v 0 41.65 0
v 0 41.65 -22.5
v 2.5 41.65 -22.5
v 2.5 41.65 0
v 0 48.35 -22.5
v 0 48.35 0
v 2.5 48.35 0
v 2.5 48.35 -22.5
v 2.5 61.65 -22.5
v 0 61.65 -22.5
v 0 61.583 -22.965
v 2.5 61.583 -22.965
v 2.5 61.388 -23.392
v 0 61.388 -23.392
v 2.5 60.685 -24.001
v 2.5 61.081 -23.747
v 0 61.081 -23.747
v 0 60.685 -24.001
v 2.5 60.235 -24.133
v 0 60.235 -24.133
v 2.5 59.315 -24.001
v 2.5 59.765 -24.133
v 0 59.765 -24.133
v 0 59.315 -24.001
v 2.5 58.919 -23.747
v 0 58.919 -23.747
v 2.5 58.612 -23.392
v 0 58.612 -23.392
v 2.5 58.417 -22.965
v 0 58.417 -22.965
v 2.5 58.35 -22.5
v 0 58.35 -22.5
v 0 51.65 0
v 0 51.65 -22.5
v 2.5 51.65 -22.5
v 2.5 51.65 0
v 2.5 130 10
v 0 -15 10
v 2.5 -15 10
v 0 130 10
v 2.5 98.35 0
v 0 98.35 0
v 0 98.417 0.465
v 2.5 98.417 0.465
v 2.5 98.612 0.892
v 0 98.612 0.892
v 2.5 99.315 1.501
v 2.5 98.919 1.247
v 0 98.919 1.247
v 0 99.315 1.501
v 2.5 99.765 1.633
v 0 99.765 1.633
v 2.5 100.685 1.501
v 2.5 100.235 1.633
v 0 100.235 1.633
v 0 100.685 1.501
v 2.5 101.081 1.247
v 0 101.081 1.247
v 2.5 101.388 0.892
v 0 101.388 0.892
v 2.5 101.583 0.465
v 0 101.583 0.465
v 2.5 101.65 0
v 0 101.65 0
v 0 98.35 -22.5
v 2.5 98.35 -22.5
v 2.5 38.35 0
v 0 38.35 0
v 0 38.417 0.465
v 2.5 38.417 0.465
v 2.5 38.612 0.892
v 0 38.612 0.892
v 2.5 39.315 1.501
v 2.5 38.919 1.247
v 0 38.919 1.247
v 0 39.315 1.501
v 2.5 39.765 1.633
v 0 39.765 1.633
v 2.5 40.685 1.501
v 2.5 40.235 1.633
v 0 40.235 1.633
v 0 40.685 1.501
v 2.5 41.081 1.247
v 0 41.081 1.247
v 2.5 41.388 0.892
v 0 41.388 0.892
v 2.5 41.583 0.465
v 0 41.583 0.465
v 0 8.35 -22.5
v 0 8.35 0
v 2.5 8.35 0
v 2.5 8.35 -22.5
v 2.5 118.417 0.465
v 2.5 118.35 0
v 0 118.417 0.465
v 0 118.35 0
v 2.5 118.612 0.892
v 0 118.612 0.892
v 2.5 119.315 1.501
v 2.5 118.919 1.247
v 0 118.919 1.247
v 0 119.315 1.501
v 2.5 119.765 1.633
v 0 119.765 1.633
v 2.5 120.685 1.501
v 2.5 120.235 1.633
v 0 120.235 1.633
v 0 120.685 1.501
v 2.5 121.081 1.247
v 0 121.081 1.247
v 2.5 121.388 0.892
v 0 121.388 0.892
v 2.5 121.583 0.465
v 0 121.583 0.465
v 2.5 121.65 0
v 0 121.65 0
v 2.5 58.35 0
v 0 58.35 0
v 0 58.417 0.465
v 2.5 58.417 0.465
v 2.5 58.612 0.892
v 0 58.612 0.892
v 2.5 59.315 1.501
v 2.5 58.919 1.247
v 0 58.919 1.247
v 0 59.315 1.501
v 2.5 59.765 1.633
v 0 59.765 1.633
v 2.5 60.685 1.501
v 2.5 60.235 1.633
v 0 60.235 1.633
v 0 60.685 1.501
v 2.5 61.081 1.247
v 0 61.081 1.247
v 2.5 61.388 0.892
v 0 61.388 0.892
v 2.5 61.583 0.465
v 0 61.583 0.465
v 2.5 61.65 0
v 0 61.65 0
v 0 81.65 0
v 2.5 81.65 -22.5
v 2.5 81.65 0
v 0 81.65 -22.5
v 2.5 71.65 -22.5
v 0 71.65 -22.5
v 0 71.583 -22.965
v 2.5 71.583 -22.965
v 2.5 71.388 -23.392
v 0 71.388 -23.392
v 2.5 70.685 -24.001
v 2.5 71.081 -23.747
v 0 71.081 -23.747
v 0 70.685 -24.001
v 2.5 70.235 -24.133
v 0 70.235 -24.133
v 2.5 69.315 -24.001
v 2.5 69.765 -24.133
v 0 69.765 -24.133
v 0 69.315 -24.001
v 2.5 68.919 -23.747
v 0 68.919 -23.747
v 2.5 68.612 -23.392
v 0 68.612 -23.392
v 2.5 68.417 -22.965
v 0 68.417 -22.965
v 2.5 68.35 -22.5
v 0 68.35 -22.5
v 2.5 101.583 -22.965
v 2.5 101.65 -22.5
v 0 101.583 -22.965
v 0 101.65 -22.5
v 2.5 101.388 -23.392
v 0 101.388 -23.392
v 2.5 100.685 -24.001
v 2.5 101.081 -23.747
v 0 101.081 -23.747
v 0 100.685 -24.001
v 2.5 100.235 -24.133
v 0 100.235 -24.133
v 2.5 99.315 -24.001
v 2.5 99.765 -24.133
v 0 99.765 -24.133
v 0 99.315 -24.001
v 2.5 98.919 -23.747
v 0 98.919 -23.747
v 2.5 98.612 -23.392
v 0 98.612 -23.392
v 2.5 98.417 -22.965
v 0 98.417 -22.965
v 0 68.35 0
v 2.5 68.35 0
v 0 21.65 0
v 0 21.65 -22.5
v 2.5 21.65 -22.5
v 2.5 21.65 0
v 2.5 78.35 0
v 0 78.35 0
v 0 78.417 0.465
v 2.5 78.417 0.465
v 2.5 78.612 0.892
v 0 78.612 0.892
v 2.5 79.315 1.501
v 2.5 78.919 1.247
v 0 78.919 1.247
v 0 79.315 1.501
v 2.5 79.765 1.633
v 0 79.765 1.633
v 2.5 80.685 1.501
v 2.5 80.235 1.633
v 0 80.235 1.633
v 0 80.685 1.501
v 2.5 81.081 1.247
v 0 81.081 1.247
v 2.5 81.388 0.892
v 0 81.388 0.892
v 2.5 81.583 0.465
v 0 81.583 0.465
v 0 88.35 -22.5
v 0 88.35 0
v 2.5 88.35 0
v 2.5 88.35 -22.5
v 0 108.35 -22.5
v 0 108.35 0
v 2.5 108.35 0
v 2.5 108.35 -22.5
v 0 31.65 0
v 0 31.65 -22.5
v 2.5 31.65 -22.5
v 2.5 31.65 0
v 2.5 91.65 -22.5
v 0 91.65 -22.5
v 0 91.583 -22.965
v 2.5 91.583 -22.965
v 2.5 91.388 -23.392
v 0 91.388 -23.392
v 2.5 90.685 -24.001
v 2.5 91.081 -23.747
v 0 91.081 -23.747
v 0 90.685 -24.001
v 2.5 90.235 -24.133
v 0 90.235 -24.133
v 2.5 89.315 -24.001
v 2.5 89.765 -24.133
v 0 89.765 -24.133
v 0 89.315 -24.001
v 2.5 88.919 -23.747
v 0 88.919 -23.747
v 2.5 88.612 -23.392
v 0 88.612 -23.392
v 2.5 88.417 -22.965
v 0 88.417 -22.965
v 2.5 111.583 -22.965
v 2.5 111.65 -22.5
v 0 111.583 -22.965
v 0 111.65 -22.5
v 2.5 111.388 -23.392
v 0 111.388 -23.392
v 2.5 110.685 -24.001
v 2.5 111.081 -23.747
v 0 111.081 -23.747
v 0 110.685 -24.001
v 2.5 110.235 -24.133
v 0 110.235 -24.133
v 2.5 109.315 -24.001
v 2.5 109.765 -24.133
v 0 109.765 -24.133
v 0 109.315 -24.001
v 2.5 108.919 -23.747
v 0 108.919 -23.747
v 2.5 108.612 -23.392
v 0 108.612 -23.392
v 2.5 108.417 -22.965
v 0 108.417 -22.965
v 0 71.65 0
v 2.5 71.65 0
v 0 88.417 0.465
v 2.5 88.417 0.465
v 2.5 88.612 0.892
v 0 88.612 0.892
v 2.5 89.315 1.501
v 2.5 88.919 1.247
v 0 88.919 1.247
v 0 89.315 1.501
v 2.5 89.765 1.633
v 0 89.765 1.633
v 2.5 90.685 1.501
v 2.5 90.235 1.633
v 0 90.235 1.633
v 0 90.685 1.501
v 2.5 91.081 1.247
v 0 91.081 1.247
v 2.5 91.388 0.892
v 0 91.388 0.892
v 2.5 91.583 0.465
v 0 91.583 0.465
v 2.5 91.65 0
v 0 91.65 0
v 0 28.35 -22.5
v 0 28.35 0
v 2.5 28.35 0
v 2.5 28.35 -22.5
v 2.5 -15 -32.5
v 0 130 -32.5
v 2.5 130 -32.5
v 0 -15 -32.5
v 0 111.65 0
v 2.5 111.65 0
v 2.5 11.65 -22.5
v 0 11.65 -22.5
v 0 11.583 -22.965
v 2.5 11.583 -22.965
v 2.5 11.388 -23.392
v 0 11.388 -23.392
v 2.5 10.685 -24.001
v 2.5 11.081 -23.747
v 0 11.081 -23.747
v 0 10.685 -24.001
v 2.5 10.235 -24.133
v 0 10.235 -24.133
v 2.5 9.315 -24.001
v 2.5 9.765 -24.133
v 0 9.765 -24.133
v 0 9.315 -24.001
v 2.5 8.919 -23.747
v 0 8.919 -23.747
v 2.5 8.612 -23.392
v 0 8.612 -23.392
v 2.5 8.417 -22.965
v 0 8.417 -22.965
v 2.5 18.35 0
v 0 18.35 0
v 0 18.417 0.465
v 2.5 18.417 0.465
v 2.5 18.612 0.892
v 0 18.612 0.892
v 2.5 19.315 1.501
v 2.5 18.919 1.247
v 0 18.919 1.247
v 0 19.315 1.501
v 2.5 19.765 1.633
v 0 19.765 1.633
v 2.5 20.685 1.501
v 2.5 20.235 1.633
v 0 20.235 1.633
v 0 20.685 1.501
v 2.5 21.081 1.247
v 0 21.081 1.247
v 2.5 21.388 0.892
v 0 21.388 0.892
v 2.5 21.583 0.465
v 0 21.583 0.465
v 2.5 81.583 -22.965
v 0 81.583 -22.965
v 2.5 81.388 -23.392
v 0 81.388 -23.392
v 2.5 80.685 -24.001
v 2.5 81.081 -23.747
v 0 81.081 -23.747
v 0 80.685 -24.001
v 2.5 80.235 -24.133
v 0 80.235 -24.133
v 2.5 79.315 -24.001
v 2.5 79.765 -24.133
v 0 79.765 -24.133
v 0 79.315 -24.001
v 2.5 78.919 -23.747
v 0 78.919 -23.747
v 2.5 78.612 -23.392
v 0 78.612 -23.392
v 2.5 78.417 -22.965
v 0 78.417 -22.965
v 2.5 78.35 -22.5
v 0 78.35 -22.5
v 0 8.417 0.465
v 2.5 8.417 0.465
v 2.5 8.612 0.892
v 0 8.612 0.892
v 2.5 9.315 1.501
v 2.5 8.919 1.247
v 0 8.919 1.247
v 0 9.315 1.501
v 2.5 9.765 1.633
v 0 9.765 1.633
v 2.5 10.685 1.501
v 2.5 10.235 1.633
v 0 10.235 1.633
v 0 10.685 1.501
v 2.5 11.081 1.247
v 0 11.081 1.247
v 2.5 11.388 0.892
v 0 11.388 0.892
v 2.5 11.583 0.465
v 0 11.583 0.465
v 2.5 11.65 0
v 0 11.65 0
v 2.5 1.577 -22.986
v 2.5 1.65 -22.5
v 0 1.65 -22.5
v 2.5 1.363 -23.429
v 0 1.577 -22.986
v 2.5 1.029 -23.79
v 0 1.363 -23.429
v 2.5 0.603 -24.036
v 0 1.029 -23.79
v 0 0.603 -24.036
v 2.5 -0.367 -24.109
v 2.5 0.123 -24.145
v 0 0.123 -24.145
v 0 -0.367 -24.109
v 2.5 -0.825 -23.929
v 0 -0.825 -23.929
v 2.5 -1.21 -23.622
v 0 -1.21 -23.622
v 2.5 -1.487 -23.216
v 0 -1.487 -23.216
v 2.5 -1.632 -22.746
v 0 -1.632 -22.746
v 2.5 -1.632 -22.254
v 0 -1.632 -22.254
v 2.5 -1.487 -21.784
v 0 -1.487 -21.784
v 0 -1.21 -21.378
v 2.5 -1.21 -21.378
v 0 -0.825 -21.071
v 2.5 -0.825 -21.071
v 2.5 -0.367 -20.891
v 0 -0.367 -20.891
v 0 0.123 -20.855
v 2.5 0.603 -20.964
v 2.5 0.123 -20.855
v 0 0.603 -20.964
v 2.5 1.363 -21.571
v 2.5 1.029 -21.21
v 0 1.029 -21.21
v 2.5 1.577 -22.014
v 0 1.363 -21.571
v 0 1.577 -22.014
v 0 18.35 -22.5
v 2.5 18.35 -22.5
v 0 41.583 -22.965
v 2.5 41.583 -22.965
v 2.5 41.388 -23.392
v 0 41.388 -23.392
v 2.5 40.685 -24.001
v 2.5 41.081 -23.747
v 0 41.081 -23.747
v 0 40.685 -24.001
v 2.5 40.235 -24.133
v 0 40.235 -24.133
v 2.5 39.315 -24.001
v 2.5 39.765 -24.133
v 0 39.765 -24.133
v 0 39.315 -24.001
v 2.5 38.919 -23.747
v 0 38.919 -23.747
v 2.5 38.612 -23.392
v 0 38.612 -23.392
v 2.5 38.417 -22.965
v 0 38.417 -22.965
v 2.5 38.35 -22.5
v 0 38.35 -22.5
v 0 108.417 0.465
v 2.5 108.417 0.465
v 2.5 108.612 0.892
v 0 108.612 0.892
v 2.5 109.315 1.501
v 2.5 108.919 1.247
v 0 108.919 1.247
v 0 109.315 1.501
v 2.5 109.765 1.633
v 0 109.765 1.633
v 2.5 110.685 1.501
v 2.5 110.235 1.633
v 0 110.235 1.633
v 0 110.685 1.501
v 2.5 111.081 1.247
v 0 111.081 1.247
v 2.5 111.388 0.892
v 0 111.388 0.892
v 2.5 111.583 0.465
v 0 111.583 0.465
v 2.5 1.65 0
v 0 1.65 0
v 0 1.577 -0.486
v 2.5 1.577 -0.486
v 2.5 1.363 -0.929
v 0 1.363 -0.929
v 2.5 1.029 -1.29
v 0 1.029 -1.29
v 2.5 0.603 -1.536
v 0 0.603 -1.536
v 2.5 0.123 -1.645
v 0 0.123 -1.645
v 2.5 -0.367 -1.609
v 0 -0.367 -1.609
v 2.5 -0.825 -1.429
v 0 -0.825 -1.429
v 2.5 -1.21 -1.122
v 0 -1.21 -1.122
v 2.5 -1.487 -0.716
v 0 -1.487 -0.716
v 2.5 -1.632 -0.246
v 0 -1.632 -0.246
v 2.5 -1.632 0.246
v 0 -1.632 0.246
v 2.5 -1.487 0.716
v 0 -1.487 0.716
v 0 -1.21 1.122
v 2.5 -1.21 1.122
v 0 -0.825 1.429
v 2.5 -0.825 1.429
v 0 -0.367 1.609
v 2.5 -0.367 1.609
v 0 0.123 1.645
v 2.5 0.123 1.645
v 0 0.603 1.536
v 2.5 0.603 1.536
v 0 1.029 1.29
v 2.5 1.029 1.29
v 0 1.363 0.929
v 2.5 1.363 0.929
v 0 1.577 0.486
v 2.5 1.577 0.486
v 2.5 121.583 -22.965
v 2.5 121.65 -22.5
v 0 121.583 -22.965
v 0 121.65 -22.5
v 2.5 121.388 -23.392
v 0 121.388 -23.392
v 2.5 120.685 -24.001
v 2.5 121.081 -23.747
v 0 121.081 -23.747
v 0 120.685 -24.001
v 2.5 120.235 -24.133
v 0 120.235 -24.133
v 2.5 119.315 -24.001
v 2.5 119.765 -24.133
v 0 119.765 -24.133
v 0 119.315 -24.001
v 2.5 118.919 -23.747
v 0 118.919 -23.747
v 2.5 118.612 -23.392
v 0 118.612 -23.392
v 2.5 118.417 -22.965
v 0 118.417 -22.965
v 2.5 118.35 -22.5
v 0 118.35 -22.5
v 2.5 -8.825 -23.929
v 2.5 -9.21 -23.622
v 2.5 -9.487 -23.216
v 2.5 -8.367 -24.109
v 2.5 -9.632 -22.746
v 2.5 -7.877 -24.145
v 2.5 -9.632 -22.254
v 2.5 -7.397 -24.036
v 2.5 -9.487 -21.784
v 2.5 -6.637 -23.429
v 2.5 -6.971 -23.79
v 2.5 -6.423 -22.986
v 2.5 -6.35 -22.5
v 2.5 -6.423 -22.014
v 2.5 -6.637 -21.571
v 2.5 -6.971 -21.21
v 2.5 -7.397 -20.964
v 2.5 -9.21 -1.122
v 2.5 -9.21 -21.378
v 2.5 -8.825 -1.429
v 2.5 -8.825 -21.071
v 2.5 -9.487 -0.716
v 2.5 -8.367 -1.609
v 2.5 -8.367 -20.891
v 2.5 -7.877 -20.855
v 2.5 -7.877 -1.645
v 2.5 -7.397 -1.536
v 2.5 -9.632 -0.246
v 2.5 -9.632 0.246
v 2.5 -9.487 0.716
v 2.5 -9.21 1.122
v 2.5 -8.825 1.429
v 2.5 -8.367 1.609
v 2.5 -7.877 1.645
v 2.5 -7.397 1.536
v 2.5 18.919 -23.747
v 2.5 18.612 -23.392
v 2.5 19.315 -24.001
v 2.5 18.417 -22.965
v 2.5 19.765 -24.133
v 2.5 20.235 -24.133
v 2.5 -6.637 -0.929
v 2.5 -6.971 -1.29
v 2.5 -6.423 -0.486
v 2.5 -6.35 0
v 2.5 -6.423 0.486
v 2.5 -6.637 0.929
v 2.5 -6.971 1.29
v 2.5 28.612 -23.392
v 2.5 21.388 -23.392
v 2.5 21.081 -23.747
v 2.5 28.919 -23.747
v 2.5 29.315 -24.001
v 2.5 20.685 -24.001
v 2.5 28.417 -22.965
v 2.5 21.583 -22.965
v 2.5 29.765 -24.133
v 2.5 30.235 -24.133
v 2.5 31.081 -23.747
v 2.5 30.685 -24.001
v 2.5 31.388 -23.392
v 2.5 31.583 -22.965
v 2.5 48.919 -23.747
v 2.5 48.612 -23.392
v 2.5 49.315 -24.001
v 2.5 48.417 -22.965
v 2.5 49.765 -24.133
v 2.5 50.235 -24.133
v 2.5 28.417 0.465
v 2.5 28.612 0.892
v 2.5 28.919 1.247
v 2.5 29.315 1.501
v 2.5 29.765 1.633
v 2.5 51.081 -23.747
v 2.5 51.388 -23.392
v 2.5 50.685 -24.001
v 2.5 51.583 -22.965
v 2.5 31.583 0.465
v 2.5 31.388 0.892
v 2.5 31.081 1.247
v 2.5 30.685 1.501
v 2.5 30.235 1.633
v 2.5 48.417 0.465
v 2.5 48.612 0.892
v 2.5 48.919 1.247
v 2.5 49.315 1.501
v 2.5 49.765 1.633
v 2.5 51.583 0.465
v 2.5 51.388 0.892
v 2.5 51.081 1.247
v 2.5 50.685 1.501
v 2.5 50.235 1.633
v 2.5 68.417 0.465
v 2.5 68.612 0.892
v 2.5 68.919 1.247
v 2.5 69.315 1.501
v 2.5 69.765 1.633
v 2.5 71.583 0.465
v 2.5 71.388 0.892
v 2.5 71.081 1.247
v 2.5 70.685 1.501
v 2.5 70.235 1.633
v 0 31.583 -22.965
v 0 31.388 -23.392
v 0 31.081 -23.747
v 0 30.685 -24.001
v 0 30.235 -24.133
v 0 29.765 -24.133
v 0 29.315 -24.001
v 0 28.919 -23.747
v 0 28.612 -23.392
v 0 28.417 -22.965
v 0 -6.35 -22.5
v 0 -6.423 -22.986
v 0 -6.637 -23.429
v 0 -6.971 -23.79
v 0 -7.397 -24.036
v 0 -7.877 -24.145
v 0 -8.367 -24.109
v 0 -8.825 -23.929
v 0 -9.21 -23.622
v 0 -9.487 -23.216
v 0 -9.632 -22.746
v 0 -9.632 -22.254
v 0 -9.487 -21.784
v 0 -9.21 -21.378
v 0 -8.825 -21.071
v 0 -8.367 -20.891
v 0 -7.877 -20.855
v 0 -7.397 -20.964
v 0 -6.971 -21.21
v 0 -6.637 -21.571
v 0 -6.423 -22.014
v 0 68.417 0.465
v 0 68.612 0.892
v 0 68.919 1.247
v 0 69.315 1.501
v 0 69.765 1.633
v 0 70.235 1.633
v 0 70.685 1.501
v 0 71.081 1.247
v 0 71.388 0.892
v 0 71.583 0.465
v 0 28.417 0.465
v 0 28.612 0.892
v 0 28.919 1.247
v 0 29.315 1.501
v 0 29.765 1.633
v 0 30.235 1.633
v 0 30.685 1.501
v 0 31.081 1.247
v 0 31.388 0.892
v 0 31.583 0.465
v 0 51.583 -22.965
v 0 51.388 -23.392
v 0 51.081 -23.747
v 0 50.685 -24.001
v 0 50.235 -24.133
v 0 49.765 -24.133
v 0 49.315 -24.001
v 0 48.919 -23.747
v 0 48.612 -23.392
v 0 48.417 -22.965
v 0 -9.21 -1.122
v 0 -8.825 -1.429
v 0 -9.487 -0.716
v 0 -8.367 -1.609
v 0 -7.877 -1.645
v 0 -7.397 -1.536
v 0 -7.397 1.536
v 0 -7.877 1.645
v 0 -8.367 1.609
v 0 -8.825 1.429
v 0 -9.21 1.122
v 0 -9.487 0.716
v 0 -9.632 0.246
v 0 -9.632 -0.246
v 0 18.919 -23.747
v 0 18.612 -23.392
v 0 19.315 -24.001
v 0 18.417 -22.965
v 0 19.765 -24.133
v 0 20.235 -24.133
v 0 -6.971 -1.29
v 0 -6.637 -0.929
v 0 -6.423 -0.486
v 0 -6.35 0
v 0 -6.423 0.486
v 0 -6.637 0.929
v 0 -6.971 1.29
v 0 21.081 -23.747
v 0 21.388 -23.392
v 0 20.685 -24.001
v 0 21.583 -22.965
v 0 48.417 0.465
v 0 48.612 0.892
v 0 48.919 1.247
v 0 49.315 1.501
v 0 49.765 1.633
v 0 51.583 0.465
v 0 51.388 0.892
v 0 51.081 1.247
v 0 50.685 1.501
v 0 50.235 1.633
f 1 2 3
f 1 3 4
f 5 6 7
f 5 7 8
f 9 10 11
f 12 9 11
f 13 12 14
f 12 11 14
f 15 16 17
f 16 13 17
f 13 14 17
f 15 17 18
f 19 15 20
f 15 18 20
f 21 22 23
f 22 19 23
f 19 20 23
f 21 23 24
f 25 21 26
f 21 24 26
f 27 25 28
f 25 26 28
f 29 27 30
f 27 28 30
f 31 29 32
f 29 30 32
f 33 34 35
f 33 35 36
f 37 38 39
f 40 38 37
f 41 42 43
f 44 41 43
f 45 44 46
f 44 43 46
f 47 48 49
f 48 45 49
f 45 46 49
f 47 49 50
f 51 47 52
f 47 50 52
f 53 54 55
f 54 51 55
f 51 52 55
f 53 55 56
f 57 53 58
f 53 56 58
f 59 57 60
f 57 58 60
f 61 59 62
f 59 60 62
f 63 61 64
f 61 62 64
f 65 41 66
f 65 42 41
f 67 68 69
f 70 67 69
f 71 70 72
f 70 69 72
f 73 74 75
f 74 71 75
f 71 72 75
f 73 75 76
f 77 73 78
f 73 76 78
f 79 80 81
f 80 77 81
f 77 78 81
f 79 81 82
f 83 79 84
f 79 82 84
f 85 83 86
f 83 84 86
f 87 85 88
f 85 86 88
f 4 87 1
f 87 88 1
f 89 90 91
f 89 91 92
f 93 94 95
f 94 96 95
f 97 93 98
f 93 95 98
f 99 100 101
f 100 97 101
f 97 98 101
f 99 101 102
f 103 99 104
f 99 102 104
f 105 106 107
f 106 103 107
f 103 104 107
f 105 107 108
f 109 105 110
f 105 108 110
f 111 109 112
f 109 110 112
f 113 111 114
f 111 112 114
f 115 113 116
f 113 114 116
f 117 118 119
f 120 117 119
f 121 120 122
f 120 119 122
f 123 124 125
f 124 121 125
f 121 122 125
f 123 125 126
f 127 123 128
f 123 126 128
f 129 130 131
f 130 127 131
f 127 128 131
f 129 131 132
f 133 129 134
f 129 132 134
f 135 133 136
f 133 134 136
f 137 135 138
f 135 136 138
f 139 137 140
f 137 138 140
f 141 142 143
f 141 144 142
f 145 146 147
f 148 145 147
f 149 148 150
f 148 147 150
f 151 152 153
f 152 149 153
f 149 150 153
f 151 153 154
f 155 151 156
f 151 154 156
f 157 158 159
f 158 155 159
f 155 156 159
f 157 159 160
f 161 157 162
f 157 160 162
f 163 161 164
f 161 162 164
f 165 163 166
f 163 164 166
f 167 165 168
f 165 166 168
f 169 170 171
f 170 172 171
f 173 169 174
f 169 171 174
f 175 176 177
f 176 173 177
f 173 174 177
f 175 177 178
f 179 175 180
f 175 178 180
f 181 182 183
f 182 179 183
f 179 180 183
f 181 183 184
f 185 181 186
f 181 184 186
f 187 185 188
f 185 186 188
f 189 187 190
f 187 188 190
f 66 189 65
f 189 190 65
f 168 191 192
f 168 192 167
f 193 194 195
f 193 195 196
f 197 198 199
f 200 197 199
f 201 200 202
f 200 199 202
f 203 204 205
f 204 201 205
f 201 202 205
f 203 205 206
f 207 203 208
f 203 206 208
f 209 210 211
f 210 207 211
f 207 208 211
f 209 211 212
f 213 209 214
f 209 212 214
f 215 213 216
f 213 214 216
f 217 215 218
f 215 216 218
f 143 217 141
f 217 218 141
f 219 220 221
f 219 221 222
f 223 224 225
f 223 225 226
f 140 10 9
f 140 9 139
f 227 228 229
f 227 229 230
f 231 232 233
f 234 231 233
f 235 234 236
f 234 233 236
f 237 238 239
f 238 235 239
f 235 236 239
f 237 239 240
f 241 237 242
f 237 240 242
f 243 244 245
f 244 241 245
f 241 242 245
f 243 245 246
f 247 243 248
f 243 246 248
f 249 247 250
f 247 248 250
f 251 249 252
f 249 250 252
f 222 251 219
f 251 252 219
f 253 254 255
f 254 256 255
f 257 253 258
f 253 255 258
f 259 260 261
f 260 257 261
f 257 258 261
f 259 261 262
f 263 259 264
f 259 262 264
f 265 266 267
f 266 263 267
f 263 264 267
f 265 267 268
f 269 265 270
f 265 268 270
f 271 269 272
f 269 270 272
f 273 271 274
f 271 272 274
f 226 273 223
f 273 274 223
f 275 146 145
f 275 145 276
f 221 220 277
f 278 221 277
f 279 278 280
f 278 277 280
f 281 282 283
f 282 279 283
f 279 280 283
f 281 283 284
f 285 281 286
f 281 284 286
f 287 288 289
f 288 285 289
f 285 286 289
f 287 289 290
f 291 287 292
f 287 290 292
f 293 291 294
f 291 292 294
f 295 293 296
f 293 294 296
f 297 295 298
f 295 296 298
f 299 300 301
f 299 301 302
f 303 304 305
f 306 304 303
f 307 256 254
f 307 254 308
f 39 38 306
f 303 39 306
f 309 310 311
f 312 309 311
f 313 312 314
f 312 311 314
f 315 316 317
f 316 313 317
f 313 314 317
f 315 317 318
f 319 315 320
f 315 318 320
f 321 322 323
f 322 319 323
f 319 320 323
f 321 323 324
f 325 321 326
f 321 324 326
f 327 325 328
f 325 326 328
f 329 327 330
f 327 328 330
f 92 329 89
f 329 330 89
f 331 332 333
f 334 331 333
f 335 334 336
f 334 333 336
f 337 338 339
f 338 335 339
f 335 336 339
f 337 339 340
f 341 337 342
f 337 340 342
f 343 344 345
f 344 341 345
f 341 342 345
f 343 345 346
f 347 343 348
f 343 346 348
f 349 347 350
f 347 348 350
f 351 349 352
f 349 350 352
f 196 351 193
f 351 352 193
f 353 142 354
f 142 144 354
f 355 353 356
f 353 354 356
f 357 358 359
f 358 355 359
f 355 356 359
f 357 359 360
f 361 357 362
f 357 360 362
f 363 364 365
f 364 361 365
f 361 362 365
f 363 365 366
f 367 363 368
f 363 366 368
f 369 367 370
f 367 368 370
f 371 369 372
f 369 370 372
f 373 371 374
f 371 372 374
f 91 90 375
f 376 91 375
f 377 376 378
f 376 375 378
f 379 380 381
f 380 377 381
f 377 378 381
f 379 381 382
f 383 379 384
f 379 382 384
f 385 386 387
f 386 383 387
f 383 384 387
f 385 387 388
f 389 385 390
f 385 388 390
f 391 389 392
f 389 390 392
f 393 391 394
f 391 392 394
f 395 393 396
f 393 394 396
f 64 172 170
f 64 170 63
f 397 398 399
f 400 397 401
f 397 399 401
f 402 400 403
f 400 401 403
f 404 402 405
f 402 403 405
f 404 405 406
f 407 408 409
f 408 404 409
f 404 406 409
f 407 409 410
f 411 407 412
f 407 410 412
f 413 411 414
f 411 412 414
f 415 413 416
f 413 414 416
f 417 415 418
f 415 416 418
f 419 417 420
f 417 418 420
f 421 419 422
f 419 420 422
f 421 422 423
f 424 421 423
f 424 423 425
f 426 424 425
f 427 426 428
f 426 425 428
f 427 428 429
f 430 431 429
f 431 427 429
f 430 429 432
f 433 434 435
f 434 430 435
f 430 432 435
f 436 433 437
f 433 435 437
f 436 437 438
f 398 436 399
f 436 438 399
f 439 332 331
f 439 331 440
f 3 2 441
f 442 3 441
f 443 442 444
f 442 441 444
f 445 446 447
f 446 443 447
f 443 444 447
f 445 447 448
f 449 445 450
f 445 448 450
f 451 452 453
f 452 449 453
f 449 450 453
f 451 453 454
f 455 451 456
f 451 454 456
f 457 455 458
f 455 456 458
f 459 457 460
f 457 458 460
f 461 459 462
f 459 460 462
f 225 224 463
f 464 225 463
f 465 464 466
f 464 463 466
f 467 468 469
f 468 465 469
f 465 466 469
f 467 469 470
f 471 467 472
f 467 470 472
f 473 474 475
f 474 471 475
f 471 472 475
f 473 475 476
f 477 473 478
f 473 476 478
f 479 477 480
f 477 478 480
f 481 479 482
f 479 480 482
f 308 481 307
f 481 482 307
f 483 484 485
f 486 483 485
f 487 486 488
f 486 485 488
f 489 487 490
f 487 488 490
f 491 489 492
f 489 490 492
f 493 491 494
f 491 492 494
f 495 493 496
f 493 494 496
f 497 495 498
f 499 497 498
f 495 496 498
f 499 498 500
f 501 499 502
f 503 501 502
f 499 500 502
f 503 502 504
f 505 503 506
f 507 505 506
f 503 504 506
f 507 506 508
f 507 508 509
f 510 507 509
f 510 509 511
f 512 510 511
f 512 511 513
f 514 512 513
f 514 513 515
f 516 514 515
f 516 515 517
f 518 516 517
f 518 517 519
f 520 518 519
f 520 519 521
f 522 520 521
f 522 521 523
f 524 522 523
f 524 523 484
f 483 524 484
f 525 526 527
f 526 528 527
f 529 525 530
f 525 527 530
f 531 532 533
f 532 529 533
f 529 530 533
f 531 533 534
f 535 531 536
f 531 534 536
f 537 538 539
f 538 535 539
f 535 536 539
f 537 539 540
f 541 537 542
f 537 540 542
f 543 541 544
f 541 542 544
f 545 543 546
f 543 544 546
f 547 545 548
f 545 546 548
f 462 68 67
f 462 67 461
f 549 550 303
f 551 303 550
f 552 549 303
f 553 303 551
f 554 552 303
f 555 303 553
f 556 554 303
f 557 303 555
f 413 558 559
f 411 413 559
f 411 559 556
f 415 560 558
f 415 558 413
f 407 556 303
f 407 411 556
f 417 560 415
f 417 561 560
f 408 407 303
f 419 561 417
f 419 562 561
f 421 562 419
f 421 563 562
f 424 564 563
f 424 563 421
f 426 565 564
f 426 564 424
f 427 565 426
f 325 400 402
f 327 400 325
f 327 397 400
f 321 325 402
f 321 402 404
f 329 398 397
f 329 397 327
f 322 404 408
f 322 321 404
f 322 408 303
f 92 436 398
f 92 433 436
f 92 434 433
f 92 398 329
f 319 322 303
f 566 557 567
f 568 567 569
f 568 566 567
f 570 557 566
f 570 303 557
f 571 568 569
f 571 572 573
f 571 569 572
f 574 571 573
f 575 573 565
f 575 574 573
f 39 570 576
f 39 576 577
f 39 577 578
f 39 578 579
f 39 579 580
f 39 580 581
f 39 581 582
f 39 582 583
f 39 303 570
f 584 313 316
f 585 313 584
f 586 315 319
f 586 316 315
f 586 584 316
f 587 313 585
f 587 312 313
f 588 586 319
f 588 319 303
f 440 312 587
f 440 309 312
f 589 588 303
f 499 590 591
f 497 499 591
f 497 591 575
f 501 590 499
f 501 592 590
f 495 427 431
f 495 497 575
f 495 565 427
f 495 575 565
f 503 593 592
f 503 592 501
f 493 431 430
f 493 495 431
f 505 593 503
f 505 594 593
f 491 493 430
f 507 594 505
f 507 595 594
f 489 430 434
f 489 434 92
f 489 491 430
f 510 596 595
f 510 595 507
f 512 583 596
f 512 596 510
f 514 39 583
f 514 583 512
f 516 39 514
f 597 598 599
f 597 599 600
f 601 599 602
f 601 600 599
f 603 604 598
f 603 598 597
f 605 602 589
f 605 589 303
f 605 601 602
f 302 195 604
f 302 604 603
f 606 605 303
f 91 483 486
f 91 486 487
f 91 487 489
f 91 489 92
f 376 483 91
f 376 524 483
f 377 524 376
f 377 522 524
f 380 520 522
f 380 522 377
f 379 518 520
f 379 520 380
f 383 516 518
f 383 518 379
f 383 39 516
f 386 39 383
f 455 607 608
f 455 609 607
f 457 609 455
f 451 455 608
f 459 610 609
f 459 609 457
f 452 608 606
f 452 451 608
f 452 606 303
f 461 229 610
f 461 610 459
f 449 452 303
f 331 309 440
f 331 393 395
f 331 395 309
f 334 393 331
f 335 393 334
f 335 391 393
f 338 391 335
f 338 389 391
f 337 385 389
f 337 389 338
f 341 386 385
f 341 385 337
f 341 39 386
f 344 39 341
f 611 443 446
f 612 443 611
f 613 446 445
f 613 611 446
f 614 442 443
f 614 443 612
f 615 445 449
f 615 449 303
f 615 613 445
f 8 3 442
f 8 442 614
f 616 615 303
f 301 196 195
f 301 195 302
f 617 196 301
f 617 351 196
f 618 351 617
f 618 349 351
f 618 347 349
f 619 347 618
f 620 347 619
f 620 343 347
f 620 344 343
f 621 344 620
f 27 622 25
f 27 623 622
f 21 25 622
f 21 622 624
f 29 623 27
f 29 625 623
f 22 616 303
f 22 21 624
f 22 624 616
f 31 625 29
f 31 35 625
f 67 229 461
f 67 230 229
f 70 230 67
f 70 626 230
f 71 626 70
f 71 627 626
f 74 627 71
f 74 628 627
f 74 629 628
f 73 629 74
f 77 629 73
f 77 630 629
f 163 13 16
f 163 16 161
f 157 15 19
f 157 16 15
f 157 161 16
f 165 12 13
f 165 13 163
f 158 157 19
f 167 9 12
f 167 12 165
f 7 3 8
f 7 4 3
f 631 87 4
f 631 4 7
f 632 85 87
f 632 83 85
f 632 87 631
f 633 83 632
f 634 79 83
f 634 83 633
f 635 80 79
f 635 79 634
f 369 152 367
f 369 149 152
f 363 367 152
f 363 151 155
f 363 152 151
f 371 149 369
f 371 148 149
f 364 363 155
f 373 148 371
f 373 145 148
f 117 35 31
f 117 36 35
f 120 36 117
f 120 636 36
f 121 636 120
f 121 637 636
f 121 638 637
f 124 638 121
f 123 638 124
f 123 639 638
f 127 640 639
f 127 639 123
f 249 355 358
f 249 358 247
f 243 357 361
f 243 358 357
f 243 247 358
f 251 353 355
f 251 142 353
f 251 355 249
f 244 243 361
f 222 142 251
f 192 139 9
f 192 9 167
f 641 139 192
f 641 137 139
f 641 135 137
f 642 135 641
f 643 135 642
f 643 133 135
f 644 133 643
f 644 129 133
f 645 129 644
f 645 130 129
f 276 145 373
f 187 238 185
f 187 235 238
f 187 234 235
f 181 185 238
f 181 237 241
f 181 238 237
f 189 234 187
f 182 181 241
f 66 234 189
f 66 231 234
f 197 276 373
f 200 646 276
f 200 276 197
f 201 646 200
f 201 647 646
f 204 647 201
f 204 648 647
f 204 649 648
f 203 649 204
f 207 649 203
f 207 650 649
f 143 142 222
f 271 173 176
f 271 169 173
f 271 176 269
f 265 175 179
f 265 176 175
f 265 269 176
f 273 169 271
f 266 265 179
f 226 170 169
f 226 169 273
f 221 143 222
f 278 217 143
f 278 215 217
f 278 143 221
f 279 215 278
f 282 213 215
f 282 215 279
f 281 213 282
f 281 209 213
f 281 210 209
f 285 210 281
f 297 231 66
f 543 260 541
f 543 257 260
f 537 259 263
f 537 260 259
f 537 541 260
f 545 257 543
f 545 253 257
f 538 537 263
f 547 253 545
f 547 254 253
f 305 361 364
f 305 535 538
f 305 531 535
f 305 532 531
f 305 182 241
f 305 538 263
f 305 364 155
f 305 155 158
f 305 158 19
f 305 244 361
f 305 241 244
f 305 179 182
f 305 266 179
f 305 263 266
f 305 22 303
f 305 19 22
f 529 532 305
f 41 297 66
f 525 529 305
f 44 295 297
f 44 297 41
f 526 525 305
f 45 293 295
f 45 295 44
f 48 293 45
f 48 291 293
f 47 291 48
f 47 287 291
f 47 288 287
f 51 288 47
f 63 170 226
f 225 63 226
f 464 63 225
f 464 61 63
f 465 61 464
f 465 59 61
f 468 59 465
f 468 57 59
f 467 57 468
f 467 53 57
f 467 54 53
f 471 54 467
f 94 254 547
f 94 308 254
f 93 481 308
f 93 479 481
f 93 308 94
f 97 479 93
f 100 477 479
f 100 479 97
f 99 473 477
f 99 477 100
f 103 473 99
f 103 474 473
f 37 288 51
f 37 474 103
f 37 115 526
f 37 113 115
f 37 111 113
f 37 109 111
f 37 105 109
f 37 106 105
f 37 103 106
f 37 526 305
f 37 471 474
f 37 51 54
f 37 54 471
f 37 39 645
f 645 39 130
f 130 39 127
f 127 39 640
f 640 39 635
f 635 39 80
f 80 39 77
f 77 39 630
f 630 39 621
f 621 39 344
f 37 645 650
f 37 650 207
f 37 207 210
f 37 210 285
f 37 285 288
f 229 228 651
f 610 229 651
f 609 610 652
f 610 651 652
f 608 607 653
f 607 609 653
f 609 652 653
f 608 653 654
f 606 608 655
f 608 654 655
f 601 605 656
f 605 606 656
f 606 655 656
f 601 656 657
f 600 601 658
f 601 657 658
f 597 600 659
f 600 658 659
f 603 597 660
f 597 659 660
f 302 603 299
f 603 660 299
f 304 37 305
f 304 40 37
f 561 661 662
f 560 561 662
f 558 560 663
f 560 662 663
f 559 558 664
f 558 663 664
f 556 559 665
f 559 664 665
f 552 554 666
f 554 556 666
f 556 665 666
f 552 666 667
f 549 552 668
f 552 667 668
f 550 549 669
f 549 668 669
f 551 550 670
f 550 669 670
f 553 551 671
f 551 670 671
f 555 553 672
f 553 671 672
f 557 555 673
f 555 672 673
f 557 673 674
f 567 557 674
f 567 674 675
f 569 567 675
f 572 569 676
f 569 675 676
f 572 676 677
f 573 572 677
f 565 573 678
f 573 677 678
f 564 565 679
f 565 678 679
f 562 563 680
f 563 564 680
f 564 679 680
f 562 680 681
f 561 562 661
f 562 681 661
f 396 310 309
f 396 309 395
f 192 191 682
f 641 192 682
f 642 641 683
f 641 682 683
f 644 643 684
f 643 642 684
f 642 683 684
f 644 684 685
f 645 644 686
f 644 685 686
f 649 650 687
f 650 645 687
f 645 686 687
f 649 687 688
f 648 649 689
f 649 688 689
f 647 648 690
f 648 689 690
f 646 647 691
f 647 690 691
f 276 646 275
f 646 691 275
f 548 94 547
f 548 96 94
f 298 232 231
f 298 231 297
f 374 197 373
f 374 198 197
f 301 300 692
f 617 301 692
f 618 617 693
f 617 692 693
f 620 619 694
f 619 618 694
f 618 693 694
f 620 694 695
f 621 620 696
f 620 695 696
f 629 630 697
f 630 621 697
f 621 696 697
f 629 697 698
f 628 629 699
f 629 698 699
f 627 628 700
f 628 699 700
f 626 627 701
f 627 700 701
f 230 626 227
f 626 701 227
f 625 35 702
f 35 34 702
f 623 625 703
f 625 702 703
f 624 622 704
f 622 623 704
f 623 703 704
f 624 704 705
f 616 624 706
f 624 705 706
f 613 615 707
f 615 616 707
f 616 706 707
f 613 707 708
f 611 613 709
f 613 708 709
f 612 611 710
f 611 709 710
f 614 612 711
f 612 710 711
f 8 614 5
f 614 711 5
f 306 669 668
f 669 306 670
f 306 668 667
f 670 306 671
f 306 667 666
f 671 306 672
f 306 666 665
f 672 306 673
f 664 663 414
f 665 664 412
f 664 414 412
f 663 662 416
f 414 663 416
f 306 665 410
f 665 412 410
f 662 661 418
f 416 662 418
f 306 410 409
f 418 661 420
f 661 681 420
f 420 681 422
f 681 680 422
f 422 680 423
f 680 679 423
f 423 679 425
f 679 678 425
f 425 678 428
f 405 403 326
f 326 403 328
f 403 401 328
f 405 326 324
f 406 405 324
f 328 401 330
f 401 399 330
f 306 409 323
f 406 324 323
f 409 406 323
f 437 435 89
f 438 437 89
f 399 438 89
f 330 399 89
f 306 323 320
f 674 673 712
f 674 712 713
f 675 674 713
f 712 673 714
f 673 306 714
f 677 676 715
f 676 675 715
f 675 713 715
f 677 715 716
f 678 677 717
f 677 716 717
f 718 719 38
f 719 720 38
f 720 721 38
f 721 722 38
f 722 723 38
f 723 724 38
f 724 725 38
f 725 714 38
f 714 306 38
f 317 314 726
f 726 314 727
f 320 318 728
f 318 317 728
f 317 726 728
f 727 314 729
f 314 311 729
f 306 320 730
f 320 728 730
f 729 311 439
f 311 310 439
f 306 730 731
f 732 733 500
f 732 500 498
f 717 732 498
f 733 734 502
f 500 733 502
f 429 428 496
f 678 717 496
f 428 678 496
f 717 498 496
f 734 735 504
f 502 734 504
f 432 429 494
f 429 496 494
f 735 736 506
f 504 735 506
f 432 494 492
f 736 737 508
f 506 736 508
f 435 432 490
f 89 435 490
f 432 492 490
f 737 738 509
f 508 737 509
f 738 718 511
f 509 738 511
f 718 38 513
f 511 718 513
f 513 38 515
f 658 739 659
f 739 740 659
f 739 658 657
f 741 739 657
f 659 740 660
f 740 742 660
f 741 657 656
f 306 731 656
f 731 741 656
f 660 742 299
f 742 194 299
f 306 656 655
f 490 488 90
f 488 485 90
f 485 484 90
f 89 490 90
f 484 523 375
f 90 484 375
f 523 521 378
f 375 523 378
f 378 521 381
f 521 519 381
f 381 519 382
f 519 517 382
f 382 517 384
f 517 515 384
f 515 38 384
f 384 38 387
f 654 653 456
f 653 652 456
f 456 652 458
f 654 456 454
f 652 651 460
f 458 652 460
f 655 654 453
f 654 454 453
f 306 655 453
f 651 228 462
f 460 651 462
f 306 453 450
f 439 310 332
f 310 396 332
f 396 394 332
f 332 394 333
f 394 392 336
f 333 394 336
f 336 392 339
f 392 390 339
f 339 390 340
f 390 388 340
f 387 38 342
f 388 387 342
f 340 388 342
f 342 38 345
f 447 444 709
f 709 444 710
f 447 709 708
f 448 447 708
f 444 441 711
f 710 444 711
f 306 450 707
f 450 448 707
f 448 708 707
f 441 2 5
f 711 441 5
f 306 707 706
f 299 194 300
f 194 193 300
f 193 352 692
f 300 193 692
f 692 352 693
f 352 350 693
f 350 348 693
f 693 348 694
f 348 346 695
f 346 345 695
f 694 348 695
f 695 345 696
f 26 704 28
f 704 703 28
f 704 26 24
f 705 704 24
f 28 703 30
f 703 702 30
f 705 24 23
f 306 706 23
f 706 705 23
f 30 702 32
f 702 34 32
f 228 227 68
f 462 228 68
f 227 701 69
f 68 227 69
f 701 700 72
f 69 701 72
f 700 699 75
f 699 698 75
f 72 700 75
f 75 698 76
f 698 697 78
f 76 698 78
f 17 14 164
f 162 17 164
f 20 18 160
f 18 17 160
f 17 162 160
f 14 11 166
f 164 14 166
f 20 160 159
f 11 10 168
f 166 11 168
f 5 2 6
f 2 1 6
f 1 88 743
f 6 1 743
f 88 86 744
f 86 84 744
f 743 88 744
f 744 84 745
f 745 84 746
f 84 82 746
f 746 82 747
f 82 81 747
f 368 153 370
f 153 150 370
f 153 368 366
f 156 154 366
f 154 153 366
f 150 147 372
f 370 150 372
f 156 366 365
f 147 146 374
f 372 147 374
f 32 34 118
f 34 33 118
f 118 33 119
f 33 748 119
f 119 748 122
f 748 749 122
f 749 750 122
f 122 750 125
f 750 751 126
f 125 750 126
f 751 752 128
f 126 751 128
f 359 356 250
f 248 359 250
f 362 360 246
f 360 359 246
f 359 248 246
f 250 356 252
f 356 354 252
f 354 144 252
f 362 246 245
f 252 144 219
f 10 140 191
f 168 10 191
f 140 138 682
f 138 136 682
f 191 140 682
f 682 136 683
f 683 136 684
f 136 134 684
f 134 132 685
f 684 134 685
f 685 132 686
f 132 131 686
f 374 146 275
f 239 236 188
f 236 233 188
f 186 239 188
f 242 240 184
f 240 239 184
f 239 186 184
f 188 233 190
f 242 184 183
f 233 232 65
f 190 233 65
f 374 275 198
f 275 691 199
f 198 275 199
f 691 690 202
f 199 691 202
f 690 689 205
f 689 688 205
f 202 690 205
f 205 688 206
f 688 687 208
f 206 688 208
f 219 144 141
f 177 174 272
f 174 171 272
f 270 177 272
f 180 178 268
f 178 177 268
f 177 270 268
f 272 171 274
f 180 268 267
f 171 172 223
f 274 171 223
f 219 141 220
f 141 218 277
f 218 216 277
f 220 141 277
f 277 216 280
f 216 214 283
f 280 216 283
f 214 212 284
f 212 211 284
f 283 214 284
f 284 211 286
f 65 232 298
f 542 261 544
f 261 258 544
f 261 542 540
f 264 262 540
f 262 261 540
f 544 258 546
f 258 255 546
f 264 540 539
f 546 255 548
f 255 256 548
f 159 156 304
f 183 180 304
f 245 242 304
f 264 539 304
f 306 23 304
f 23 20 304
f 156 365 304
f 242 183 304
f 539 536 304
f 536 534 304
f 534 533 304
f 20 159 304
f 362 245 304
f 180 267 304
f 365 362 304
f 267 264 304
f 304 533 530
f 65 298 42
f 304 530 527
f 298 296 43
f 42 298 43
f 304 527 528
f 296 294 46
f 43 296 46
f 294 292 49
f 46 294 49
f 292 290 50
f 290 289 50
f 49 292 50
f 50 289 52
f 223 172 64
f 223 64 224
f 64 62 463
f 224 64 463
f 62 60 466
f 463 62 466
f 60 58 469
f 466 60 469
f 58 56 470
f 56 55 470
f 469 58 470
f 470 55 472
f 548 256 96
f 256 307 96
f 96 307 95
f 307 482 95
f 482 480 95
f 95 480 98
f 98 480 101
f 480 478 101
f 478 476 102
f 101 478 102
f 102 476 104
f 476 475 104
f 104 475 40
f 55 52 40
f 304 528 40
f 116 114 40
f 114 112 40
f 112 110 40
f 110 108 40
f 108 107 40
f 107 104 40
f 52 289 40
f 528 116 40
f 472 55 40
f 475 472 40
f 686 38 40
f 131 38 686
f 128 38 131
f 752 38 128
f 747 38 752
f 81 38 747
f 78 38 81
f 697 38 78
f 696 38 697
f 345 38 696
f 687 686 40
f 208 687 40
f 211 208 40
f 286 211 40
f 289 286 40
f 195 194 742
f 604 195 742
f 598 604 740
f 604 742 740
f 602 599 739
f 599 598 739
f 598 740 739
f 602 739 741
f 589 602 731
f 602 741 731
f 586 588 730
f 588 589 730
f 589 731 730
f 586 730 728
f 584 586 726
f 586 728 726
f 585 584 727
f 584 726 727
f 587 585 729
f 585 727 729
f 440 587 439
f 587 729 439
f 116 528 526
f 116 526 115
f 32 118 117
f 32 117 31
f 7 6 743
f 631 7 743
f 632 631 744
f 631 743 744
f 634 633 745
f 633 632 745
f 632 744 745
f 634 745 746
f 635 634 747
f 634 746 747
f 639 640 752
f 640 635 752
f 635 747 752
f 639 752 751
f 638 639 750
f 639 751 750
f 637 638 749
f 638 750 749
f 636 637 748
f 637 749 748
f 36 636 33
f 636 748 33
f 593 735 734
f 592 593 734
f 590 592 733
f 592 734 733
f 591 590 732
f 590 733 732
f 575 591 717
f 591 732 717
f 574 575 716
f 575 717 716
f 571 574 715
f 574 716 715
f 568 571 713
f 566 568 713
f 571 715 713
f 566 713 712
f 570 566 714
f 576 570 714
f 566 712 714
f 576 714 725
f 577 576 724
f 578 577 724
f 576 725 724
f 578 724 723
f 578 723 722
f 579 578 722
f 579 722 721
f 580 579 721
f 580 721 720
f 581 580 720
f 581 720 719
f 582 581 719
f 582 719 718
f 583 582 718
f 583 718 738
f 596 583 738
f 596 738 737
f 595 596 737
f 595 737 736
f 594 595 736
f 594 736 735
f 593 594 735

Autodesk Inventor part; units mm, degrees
ref_plane "YZ Plane" through (0, 0, 0) normal (1, 0, 0) x (0, 1, 0)
ref_plane "XZ Plane" through (0, 0, 0) normal (0, 1, 0) x (-1, 0, 0)
ref_plane "XY Plane" through (0, 0, 0) normal (0, 0, 1) x (1, 0, 0)
sketch "Sketch1" plane through (0, 0, 0) normal (1, 0, 0) x (0, 1, 0)
  circle A0 centre (0, -22.5) radius 1.65
  circle A1 centre (-8, 0) radius 1.65
  circle A2 centre (-8, -22.5) radius 1.65
  line L0 (0, 0) -> (-15, 0)
  line L1 (-15, 0) -> (-15, -22.5)
  line L2 (0, -22.5) -> (0, 0)
  line L3 (-15, -22.5) -> (-15, -32.5)
  line L4 (-15, -32.5) -> (0, -32.5)
  line L5 (0, -32.5) -> (0, -22.5)
  line L6 (0, 0) -> (-15, 0)
  line L7 (-15, 0) -> (-15, 10)
  line L8 (-15, 10) -> (0, 10)
  line L9 (0, 10) -> (0, 0)
  line L10 (0, 10) -> (130, 10)
  line L11 (130, 10) -> (130, -32.5)
  line L12 (130, -32.5) -> (0, -32.5)
  line L13 (0, -32.5) -> (0, 10)
  line L14 (10, 0) -> (10, -22.5) construction
  line L15 (8.35, 0) -> (8.35, -22.5)
  line L16 (11.65, -22.5) -> (11.65, 0)
  arc A3 (11.65, 0) -> (8.35, 0) centre (10, 0) ccw
  arc A4 (8.35, -22.5) -> (11.65, -22.5) centre (10, -22.5) ccw
  line L17 (18.35, 0) -> (18.35, -22.5)
  line L18 (20, 0) -> (20, -22.5) construction
  line L19 (21.65, -22.5) -> (21.65, 0)
  arc A5 (21.65, 0) -> (18.35, 0) centre (20, 0) ccw
  arc A6 (18.35, -22.5) -> (21.65, -22.5) centre (20, -22.5) ccw
  line L20 (28.35, 0) -> (28.35, -22.5)
  line L21 (30, 0) -> (30, -22.5) construction
  line L22 (31.65, -22.5) -> (31.65, 0)
  arc A7 (31.65, 0) -> (28.35, 0) centre (30, 0) ccw
  arc A8 (28.35, -22.5) -> (31.65, -22.5) centre (30, -22.5) ccw
  line L23 (38.35, 0) -> (38.35, -22.5)
  line L24 (40, 0) -> (40, -22.5) construction
  line L25 (41.65, -22.5) -> (41.65, 0)
  arc A9 (41.65, 0) -> (38.35, 0) centre (40, 0) ccw
  arc A10 (38.35, -22.5) -> (41.65, -22.5) centre (40, -22.5) ccw
  line L26 (48.35, 0) -> (48.35, -22.5)
  line L27 (50, 0) -> (50, -22.5) construction
  line L28 (51.65, -22.5) -> (51.65, 0)
  arc A11 (51.65, 0) -> (48.35, 0) centre (50, 0) ccw
  arc A12 (48.35, -22.5) -> (51.65, -22.5) centre (50, -22.5) ccw
  line L29 (58.35, 0) -> (58.35, -22.5)
  line L30 (60, 0) -> (60, -22.5) construction
  line L31 (61.65, -22.5) -> (61.65, 0)
  arc A13 (61.65, 0) -> (58.35, 0) centre (60, 0) ccw
  arc A14 (58.35, -22.5) -> (61.65, -22.5) centre (60, -22.5) ccw
  line L32 (68.35, 0) -> (68.35, -22.5)
  line L33 (70, 0) -> (70, -22.5) construction
  line L34 (71.65, -22.5) -> (71.65, 0)
  arc A15 (71.65, 0) -> (68.35, 0) centre (70, 0) ccw
  arc A16 (68.35, -22.5) -> (71.65, -22.5) centre (70, -22.5) ccw
  line L35 (78.35, 0) -> (78.35, -22.5)
  line L36 (80, 0) -> (80, -22.5) construction
  line L37 (81.65, -22.5) -> (81.65, 0)
  arc A17 (81.65, 0) -> (78.35, 0) centre (80, 0) ccw
  arc A18 (78.35, -22.5) -> (81.65, -22.5) centre (80, -22.5) ccw
  line L38 (88.35, 0) -> (88.35, -22.5)
  line L39 (90, 0) -> (90, -22.5) construction
  line L40 (91.65, -22.5) -> (91.65, 0)
  arc A19 (91.65, 0) -> (88.35, 0) centre (90, 0) ccw
  arc A20 (88.35, -22.5) -> (91.65, -22.5) centre (90, -22.5) ccw
  line L41 (98.35, 0) -> (98.35, -22.5)
  line L42 (100, 0) -> (100, -22.5) construction
  line L43 (101.65, -22.5) -> (101.65, 0)
  arc A21 (101.65, 0) -> (98.35, 0) centre (100, 0) ccw
  arc A22 (98.35, -22.5) -> (101.65, -22.5) centre (100, -22.5) ccw
  line L44 (108.35, 0) -> (108.35, -22.5)
  line L45 (110, 0) -> (110, -22.5) construction
  line L46 (111.65, -22.5) -> (111.65, 0)
  arc A23 (111.65, 0) -> (108.35, 0) centre (110, 0) ccw
  arc A24 (108.35, -22.5) -> (111.65, -22.5) centre (110, -22.5) ccw
  line L47 (118.35, 0) -> (118.35, -22.5)
  line L48 (120, 0) -> (120, -22.5) construction
  line L49 (121.65, -22.5) -> (121.65, 0)
  arc A25 (121.65, 0) -> (118.35, 0) centre (120, 0) ccw
  arc A26 (118.35, -22.5) -> (121.65, -22.5) centre (120, -22.5) ccw
  circle A27 centre (0, 0) radius 1.65
  point P0 (10, -11.25)
  point P1 (20, -11.25)
  point P2 (30, -11.25)
  point P3 (40, -11.25)
  point P4 (50, -11.25)
  point P5 (60, -11.25)
  point P6 (70, -11.25)
  point P7 (80, -11.25)
  point P8 (90, -11.25)
  point P9 (100, -11.25)
  point P10 (110, -11.25)
  point P11 (120, -11.25)
  dimension "d1" = 3.3
  dimension "d3" = 3.3
  dimension "d5" = 3.3
  dimension "d6" = 10
  dimension "d7" = 10
  dimension "d9" = 3.3
  dimension "d13" = 10
  dimension "d20" = 15
  dimension "d22" = 7
  dimension "d23" = 7
  dimension "d24" = 8
  dimension "d25" = 3.3
  dimension "d26" = 8
  dimension "d27" = 8
extrude "Extrusion1" add sketch "Sketch1" along normal blind 2.5 contours A0 L2 A27 L9 L10 L11 L12 L5 | A0 L5 L4 L3 L1 L0 A1 A27 L2 | L0 A1 L7 L8 L9 A27
properties part number "Wall Conyevor Depan_3DPrint"
